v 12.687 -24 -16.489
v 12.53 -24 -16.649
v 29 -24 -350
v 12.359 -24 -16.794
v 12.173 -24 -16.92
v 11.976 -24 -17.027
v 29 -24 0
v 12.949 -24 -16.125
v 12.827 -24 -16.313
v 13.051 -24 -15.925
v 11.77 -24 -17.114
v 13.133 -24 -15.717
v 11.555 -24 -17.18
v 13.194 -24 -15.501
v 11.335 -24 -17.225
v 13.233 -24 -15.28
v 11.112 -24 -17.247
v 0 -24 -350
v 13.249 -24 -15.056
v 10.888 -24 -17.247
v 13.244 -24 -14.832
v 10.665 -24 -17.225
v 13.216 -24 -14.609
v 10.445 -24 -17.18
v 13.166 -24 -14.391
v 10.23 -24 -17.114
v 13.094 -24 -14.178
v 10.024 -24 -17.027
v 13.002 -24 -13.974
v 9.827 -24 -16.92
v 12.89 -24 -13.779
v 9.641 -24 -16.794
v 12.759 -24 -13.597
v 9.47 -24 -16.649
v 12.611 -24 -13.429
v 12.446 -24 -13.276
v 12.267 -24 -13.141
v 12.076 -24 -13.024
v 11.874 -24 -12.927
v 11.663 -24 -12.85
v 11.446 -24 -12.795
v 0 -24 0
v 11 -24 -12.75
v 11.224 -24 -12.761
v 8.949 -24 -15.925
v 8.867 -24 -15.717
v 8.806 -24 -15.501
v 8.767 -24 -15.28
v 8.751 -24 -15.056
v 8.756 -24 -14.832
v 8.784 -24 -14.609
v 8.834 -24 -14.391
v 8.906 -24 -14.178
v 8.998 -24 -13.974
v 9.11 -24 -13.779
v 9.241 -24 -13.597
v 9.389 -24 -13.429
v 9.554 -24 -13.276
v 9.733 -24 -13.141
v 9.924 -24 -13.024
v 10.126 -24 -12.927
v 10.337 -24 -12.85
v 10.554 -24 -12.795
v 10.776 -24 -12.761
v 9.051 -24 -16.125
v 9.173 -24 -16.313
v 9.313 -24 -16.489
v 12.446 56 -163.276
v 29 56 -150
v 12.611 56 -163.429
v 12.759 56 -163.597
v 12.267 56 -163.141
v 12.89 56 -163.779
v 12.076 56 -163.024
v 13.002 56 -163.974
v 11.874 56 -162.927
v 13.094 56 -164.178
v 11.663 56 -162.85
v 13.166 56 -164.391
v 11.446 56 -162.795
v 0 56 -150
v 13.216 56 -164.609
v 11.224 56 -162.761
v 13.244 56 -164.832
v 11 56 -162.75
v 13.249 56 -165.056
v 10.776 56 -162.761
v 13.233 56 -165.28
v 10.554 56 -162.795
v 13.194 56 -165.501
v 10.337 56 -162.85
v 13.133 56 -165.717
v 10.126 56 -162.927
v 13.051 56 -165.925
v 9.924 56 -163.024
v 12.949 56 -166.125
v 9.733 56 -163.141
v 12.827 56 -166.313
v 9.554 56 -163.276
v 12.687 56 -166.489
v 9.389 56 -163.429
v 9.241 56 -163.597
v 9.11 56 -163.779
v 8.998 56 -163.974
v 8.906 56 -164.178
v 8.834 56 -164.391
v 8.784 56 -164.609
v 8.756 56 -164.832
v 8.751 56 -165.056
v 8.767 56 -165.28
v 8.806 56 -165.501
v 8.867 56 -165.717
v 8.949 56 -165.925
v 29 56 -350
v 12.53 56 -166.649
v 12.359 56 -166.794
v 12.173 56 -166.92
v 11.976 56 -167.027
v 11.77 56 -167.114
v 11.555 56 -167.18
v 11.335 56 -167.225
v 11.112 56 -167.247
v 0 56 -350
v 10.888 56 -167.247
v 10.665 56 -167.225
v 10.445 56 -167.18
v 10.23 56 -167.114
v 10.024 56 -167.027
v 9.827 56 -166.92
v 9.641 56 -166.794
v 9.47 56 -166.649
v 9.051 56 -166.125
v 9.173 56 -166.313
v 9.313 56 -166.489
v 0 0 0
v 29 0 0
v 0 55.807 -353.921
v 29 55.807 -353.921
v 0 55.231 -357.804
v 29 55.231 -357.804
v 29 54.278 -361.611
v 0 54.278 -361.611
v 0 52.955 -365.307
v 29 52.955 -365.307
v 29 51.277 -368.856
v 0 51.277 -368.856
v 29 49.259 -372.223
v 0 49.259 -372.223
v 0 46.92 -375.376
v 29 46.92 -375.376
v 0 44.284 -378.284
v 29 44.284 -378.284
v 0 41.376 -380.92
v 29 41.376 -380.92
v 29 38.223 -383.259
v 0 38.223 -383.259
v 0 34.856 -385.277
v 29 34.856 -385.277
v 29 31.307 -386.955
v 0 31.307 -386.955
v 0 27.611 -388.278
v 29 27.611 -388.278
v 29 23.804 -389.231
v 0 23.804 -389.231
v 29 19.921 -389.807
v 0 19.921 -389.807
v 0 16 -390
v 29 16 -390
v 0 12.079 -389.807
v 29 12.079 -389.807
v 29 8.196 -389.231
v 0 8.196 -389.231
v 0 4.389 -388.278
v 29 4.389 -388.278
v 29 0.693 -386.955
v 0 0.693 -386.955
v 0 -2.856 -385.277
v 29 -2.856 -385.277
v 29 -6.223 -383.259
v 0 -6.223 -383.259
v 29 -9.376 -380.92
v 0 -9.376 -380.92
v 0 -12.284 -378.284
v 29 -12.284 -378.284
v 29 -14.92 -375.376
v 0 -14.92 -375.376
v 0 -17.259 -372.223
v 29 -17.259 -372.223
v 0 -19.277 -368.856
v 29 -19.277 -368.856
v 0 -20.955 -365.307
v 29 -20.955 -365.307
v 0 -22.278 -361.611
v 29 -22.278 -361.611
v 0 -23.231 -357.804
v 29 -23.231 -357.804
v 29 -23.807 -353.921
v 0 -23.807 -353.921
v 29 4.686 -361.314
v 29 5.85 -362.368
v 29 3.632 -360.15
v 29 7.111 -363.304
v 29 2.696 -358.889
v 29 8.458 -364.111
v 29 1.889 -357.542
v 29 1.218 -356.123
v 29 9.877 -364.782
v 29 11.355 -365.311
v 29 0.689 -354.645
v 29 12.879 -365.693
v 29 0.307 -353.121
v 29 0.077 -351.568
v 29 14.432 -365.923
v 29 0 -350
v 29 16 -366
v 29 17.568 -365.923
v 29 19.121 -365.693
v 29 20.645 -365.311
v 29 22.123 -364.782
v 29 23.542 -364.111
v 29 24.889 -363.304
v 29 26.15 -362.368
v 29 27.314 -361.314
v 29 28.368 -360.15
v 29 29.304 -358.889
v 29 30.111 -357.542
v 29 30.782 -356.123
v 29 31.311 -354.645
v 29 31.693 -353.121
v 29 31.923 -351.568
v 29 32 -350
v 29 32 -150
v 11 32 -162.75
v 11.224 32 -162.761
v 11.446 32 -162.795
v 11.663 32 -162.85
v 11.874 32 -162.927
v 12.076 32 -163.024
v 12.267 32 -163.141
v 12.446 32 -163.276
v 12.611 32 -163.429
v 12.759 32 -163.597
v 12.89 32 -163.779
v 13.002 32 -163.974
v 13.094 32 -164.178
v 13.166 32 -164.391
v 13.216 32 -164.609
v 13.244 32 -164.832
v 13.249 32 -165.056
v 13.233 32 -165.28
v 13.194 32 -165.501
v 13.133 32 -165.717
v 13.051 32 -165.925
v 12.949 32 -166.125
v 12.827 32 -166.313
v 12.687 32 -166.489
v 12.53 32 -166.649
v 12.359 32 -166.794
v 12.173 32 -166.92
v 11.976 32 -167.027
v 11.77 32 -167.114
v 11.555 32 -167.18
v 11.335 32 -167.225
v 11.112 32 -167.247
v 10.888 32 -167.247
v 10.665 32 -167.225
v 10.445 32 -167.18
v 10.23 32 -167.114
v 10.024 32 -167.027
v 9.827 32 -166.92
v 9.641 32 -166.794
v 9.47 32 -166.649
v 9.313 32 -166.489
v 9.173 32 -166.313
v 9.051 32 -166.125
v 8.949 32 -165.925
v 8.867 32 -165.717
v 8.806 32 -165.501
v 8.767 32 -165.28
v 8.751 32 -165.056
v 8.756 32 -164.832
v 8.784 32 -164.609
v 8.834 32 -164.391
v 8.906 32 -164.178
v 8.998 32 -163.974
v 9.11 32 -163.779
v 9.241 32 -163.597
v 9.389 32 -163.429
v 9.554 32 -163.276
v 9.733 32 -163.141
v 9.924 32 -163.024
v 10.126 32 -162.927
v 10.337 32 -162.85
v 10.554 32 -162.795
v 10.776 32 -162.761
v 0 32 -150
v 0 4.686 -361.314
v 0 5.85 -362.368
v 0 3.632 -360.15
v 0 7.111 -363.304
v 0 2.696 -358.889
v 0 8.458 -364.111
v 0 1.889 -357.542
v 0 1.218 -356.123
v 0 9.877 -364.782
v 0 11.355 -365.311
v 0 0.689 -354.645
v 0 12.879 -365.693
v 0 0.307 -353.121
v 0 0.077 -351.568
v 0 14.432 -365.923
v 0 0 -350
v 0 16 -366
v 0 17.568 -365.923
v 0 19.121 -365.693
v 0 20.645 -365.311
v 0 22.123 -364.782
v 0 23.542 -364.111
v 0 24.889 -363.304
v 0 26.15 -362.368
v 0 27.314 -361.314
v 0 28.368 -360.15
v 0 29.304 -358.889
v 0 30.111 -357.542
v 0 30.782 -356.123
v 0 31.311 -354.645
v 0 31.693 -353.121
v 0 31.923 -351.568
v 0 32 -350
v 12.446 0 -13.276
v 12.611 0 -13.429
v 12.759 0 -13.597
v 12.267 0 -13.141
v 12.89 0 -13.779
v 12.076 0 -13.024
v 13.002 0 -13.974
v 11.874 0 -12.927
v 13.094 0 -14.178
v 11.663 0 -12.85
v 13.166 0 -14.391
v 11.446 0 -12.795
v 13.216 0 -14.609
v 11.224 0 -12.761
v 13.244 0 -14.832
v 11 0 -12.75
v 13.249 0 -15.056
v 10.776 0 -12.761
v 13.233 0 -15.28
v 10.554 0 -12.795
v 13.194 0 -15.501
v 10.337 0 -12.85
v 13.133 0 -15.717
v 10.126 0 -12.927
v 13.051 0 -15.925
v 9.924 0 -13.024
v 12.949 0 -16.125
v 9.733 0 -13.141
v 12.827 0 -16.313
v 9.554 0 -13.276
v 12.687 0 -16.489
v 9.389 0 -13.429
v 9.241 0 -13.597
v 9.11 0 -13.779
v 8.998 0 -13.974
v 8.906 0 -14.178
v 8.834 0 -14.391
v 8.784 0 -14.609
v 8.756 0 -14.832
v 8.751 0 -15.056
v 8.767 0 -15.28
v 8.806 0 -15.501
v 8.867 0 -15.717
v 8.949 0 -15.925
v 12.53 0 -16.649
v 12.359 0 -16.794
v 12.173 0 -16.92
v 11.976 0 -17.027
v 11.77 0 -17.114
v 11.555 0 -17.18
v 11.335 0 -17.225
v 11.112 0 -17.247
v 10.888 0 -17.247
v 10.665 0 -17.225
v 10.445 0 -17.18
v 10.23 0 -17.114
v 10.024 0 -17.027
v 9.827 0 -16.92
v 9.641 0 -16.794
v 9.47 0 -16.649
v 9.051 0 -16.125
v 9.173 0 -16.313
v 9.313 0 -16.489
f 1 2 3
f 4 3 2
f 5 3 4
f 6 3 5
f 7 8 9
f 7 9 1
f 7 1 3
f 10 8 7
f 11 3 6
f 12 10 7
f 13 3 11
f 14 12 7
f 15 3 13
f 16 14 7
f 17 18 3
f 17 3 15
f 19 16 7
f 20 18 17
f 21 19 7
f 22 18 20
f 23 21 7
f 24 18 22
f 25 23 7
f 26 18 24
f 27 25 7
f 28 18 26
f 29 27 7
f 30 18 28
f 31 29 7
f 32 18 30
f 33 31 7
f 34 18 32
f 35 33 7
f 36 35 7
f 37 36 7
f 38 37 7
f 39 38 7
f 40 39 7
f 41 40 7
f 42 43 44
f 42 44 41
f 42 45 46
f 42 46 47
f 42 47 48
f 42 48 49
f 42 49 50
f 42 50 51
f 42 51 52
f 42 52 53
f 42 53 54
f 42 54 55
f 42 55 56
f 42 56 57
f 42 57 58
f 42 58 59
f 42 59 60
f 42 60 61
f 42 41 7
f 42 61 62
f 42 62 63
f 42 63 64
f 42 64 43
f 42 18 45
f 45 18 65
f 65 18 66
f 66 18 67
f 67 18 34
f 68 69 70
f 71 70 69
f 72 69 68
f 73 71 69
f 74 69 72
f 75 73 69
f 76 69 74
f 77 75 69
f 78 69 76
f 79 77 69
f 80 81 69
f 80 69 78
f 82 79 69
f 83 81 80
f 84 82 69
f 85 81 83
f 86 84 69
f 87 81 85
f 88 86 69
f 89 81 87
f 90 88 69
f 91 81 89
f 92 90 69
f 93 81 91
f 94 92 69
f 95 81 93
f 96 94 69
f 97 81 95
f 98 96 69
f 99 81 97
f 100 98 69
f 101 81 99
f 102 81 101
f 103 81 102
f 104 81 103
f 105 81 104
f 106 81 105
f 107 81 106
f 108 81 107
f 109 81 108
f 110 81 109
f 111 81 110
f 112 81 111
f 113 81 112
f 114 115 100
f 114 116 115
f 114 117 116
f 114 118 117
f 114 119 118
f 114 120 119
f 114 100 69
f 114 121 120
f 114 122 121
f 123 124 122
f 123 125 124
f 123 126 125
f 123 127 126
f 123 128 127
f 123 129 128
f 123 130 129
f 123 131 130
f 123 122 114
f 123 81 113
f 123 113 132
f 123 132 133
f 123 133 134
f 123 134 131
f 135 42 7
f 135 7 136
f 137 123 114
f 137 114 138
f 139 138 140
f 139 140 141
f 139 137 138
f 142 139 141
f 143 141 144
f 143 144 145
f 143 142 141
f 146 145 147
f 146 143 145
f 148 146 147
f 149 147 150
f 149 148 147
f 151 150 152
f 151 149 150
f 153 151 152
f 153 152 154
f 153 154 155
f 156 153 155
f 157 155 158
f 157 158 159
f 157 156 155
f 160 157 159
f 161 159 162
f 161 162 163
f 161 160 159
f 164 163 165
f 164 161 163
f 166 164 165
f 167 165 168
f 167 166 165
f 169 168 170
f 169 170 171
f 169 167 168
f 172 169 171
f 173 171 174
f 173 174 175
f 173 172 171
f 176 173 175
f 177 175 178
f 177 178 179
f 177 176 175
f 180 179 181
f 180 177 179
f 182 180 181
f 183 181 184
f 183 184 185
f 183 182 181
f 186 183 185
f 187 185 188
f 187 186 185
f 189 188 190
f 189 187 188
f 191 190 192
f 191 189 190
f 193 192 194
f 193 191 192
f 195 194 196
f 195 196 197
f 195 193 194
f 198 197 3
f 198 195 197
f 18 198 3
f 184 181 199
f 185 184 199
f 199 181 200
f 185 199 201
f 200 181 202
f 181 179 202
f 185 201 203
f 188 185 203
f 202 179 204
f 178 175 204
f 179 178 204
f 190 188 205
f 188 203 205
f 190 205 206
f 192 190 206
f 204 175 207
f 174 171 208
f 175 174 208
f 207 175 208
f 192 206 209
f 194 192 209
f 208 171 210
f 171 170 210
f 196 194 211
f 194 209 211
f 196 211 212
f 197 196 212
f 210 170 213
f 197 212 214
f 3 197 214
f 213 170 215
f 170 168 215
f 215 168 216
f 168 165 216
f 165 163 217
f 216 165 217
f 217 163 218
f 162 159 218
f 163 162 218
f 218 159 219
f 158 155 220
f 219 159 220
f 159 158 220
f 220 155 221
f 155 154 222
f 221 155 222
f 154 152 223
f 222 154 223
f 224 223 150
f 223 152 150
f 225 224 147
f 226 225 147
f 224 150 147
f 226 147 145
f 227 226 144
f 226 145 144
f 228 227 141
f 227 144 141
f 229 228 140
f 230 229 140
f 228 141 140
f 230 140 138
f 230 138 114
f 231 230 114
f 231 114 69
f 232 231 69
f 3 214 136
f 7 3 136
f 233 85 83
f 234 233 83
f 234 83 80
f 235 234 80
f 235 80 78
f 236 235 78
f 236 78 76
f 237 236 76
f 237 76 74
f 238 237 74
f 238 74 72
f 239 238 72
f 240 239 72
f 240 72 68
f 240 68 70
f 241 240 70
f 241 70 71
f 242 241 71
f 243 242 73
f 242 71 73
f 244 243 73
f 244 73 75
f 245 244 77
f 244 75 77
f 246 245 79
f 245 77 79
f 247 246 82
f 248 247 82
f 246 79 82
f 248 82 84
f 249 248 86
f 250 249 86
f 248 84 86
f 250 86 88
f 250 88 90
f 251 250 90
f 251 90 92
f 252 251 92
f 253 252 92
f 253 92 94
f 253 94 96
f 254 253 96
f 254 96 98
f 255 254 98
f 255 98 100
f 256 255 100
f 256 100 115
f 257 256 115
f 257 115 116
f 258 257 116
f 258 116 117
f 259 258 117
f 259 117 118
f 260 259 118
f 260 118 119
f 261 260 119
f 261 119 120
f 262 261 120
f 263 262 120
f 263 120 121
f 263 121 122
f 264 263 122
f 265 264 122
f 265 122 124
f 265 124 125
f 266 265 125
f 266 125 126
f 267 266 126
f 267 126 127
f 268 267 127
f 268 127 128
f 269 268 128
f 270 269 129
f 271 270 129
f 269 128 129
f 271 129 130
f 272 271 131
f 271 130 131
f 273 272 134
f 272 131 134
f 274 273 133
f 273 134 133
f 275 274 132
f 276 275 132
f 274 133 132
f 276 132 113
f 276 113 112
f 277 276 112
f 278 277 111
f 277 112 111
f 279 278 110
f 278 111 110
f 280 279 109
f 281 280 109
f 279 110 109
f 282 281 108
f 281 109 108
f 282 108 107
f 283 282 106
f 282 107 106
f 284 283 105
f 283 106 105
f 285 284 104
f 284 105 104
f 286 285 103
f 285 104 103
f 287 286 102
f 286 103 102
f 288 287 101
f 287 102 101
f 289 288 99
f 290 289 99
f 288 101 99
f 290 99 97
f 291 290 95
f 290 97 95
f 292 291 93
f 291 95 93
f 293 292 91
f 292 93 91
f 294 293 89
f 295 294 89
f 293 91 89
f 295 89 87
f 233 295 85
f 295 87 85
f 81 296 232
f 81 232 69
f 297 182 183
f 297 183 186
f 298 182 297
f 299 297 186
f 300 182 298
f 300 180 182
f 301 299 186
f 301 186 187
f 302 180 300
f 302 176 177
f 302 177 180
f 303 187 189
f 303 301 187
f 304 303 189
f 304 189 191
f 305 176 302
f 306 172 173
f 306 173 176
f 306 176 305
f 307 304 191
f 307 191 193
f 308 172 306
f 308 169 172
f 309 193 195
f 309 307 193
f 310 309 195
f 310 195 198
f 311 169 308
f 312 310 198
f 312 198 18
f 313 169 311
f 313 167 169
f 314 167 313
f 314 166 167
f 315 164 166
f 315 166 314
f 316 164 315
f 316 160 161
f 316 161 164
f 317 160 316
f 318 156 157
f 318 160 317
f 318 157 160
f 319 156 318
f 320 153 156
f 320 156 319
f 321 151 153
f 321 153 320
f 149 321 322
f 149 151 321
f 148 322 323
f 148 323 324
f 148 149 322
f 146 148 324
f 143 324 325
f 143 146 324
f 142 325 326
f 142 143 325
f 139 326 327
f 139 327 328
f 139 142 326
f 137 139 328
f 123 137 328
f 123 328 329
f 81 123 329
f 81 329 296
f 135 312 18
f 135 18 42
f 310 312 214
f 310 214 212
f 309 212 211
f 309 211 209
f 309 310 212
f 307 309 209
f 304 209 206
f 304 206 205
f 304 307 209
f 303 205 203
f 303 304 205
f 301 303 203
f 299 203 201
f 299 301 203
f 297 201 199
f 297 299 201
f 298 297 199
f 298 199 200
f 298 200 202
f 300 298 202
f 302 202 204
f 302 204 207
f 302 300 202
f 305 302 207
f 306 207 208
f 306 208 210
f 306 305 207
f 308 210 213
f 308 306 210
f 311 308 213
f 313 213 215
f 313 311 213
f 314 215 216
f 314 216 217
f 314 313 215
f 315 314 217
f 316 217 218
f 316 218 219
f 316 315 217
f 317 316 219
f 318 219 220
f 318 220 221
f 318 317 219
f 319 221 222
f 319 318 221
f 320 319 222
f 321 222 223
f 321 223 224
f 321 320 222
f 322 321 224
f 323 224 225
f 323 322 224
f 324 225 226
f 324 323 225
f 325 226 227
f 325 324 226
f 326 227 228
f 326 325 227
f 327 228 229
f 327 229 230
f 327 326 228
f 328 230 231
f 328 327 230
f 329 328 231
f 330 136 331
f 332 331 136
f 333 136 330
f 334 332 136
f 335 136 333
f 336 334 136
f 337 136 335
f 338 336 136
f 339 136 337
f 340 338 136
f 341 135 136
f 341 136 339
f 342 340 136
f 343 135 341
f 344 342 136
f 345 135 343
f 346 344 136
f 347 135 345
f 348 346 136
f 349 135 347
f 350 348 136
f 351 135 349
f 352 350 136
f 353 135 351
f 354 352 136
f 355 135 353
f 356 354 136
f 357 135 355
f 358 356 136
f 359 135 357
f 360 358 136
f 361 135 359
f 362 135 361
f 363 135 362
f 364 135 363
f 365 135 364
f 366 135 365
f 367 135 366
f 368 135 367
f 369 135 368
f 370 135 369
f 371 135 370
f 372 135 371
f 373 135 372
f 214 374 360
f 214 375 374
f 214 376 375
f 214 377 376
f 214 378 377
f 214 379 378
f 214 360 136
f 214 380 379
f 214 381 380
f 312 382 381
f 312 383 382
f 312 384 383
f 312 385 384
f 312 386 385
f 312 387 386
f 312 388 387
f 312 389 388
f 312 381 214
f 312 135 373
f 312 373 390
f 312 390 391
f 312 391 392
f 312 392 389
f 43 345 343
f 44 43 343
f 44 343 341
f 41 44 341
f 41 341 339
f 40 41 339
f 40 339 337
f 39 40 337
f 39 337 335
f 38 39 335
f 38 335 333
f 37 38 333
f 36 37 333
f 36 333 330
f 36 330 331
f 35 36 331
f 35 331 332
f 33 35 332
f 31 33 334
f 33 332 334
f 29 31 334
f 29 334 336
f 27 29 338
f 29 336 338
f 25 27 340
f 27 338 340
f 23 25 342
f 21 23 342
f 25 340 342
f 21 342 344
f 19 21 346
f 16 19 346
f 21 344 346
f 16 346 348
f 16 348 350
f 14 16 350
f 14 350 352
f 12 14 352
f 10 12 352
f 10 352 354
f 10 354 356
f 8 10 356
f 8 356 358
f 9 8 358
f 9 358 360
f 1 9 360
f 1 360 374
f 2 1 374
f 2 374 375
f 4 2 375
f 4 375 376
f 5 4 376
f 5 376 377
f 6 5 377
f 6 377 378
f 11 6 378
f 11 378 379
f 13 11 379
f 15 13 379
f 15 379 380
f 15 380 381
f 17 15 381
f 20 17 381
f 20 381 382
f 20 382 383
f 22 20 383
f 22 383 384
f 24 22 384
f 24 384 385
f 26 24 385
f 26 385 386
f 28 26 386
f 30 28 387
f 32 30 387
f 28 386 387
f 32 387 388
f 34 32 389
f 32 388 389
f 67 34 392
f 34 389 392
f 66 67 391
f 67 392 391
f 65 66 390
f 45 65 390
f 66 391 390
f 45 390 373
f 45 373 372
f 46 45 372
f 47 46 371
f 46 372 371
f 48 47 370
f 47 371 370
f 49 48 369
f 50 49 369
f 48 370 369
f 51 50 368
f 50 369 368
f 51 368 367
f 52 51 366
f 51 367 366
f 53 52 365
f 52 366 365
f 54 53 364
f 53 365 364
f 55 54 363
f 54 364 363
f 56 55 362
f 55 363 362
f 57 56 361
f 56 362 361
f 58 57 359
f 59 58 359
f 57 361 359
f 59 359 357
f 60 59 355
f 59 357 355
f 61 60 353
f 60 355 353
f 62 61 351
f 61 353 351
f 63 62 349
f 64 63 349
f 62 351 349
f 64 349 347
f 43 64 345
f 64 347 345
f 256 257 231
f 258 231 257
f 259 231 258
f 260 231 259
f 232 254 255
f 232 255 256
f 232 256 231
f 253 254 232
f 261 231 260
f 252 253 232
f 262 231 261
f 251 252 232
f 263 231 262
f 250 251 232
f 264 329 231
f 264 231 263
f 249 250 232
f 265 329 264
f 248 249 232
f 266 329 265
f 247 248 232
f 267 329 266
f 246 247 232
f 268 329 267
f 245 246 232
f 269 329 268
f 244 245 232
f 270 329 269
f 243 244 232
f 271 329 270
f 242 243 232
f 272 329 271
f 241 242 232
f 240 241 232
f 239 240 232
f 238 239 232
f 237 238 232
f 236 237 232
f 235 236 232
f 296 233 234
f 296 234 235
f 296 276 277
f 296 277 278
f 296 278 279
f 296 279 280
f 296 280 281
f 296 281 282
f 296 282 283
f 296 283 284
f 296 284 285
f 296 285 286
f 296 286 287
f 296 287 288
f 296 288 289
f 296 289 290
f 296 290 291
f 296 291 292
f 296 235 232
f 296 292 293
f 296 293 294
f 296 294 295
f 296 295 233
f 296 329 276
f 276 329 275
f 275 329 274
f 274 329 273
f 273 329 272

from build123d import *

# Parameters (mm, degrees)
EXTRUDE_1_DEPTH     = 29
SKETCH_2_R          = 2.25
CUT_EXTRUDE_1_DEPTH = 90
SKETCH_3_R          = 2.25
CUT_EXTRUDE_2_DEPTH = 40


with BuildPart() as part:
    # 草图1 → 凸台-拉伸1 (new body)
    with BuildSketch(Plane(origin=(0, 0, 0), x_dir=(0, 0, -1), z_dir=(1, 0, 0))):
        with BuildLine():
            Line((0, 0), (350, 0))
            ThreePointArc((350, 0), (366, 16), (350, 32))
            Line((350, 32), (150, 32))
            Line((150, 32), (150, 56))
            Line((150, 56), (350, 56))
            ThreePointArc((350, 56), (390, 16), (350, -24))
            Line((350, -24), (0, -24))
            Line((0, -24), (0, 0))
        make_face()
    extrude(amount=EXTRUDE_1_DEPTH)

    # 草图2 → 切除-拉伸1 (cut)
    with BuildSketch(Plane(origin=(0, 0, 0), x_dir=(1, 0, 0), z_dir=(0, 1, 0))):
        with Locations((36, 15)):
            Circle(SKETCH_2_R)
        with Locations(Location((11, 15, 0), (0, 0, 270))):
            Circle(SKETCH_2_R)
    extrude(amount=-CUT_EXTRUDE_1_DEPTH, mode=Mode.SUBTRACT)

    # 草图3 → 切除-拉伸2 (cut)
    with BuildSketch(Plane(origin=(0, 56, 0), x_dir=(1, 0, 0), z_dir=(0, 1, 0))):
        with Locations(Location((11, 165, 0), (0, 0, 270))):
            Circle(SKETCH_3_R)
        with Locations((36, 165)):
            Circle(SKETCH_3_R)
    extrude(amount=-CUT_EXTRUDE_2_DEPTH, mode=Mode.SUBTRACT)


solid = part.part
